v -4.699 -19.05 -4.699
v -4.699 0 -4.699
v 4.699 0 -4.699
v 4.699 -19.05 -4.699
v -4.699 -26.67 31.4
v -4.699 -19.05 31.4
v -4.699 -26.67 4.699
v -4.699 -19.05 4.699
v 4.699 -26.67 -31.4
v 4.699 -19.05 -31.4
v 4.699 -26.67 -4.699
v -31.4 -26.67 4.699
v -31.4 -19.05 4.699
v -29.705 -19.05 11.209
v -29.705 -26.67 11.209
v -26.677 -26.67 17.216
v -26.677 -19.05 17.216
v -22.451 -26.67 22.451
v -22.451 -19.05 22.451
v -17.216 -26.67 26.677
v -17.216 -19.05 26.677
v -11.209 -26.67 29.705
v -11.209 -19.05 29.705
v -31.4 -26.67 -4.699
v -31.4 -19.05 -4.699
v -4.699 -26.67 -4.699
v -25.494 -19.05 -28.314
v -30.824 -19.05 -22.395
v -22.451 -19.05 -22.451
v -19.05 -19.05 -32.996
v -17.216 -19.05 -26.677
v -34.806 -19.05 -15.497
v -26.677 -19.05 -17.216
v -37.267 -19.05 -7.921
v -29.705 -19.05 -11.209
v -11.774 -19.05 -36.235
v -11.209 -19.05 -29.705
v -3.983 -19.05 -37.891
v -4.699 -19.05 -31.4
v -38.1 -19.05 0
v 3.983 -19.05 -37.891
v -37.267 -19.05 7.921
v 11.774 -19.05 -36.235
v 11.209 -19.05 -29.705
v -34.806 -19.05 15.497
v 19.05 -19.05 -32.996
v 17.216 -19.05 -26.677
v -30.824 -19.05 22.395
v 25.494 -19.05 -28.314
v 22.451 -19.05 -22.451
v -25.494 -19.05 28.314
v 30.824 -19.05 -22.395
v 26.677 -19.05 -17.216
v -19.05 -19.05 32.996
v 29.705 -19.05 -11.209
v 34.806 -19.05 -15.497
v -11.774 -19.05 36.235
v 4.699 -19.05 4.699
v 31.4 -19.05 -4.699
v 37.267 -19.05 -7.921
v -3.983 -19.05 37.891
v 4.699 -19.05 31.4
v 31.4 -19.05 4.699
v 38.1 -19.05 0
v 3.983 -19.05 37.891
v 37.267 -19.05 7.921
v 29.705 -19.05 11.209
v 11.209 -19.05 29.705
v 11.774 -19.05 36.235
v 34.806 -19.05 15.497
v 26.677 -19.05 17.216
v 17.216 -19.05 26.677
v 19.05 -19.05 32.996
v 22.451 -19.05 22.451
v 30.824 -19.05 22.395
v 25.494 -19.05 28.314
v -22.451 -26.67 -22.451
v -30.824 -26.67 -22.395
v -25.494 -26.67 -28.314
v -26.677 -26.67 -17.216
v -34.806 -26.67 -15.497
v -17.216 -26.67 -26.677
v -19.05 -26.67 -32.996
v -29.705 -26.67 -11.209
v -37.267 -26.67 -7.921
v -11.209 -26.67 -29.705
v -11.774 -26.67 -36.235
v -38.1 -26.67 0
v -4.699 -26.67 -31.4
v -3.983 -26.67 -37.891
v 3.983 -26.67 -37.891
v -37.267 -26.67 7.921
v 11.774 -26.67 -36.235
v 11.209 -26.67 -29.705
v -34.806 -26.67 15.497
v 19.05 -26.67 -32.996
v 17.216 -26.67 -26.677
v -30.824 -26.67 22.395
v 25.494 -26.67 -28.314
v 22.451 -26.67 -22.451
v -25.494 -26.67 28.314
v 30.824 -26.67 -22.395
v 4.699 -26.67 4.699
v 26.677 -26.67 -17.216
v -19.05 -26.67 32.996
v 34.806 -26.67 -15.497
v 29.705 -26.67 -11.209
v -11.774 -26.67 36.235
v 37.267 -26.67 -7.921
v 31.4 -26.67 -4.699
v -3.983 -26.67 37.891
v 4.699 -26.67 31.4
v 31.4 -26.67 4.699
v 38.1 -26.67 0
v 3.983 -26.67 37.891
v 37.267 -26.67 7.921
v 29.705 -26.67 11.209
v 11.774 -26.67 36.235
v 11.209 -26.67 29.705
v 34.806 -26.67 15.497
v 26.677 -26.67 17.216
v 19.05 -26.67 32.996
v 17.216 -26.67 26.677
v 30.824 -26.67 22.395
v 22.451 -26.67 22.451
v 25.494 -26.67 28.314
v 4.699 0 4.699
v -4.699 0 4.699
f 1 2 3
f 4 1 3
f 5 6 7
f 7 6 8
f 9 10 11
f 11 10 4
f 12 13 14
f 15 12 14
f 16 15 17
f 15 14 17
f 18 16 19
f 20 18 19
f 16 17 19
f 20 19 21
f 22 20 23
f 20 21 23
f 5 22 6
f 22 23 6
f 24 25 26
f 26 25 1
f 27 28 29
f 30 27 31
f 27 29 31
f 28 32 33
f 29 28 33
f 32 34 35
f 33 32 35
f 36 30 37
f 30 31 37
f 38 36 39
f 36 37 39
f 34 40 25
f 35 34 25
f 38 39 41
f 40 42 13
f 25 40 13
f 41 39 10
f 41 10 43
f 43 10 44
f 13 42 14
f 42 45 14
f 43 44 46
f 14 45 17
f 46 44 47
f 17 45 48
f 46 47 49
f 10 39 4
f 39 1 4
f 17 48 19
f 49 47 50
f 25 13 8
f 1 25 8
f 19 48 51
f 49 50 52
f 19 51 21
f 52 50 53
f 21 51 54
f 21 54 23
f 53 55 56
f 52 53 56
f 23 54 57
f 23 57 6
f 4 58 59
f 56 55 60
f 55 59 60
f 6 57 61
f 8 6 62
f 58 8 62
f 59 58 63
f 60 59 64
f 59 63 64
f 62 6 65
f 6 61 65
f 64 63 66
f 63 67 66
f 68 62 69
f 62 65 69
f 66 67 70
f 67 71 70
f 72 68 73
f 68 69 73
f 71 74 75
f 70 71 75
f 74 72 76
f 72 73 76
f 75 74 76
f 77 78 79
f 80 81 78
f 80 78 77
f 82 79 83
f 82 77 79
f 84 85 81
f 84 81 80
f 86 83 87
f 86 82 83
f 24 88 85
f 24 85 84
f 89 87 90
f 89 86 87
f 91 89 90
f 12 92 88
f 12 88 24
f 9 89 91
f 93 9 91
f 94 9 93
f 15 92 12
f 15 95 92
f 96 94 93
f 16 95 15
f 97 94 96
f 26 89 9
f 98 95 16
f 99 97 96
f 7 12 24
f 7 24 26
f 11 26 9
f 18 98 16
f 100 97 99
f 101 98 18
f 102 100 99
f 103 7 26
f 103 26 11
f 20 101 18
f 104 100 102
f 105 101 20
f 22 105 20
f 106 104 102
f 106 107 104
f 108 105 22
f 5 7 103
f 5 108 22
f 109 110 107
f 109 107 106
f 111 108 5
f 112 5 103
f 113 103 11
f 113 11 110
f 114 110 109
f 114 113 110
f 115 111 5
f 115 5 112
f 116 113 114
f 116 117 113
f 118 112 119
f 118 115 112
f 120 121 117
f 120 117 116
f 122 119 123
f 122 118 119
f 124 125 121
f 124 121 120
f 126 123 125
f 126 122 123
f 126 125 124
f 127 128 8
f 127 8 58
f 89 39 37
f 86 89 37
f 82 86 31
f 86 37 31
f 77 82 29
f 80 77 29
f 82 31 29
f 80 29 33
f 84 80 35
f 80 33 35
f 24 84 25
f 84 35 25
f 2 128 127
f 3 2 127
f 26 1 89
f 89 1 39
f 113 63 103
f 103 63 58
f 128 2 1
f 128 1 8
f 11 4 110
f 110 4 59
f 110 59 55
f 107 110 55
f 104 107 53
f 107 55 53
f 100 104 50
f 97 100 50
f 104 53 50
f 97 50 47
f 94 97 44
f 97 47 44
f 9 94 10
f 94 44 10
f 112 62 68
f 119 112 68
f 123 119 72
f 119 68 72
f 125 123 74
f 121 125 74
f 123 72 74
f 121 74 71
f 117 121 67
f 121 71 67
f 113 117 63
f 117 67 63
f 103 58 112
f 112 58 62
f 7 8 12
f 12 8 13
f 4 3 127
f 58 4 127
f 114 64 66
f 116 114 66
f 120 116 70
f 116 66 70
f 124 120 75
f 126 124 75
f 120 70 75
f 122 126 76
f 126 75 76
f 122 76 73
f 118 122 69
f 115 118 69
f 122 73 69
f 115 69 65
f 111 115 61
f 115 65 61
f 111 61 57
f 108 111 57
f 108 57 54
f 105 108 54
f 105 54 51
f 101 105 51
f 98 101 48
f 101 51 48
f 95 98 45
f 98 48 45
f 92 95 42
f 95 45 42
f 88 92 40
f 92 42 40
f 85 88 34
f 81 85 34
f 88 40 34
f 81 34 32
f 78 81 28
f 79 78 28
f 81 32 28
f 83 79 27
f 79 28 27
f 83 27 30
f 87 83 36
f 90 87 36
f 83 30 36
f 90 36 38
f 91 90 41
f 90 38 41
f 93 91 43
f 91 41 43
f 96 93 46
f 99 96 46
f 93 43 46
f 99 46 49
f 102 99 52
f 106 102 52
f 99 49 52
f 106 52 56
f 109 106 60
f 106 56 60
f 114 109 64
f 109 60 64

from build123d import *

# Parameters (mm, degrees)
F0_W     = 9.398
F0_H     = 9.398
F1_DEPTH = 19.05
F2_R     = 38.1
F3_DEPTH = 7.62


with BuildPart() as f1:
    # F0 (on Front) → F1 (new body)
    with BuildSketch(Plane.XZ):
        Rectangle(F0_W, F0_H)
    extrude(amount=F1_DEPTH)

    # F2 (on face) → F3 (join)
    with BuildSketch(Plane.XZ.offset(19.05)):
        Circle(F2_R)
        with BuildLine():
            Line((-31.400349, -4.699), (-4.699, -4.699))
            Line((-4.699, -4.699), (-4.699, -31.400349))
            ThreePointArc((-4.699, -31.400349), (-22.45064, -22.45064), (-31.400349, -4.699))
        make_face(mode=Mode.SUBTRACT)
        with BuildLine():
            Line((4.699, -31.400349), (4.699, -4.699))
            Line((4.699, -4.699), (31.400349, -4.699))
            ThreePointArc((31.400349, -4.699), (22.45064, -22.45064), (4.699, -31.400349))
        make_face(mode=Mode.SUBTRACT)
        with BuildLine():
            ThreePointArc((-31.400349, 4.699), (-22.45064, 22.45064), (-4.699, 31.400349))
            Line((-4.699, 31.400349), (-4.699, 4.699))
            Line((-4.699, 4.699), (-31.400349, 4.699))
        make_face(mode=Mode.SUBTRACT)
        with BuildLine():
            Line((31.400349, 4.699), (4.699, 4.699))
            Line((4.699, 4.699), (4.699, 31.400349))
            ThreePointArc((4.699, 31.400349), (22.45064, 22.45064), (31.400349, 4.699))
        make_face(mode=Mode.SUBTRACT)
    extrude(amount=F3_DEPTH)


solid = f1.part
